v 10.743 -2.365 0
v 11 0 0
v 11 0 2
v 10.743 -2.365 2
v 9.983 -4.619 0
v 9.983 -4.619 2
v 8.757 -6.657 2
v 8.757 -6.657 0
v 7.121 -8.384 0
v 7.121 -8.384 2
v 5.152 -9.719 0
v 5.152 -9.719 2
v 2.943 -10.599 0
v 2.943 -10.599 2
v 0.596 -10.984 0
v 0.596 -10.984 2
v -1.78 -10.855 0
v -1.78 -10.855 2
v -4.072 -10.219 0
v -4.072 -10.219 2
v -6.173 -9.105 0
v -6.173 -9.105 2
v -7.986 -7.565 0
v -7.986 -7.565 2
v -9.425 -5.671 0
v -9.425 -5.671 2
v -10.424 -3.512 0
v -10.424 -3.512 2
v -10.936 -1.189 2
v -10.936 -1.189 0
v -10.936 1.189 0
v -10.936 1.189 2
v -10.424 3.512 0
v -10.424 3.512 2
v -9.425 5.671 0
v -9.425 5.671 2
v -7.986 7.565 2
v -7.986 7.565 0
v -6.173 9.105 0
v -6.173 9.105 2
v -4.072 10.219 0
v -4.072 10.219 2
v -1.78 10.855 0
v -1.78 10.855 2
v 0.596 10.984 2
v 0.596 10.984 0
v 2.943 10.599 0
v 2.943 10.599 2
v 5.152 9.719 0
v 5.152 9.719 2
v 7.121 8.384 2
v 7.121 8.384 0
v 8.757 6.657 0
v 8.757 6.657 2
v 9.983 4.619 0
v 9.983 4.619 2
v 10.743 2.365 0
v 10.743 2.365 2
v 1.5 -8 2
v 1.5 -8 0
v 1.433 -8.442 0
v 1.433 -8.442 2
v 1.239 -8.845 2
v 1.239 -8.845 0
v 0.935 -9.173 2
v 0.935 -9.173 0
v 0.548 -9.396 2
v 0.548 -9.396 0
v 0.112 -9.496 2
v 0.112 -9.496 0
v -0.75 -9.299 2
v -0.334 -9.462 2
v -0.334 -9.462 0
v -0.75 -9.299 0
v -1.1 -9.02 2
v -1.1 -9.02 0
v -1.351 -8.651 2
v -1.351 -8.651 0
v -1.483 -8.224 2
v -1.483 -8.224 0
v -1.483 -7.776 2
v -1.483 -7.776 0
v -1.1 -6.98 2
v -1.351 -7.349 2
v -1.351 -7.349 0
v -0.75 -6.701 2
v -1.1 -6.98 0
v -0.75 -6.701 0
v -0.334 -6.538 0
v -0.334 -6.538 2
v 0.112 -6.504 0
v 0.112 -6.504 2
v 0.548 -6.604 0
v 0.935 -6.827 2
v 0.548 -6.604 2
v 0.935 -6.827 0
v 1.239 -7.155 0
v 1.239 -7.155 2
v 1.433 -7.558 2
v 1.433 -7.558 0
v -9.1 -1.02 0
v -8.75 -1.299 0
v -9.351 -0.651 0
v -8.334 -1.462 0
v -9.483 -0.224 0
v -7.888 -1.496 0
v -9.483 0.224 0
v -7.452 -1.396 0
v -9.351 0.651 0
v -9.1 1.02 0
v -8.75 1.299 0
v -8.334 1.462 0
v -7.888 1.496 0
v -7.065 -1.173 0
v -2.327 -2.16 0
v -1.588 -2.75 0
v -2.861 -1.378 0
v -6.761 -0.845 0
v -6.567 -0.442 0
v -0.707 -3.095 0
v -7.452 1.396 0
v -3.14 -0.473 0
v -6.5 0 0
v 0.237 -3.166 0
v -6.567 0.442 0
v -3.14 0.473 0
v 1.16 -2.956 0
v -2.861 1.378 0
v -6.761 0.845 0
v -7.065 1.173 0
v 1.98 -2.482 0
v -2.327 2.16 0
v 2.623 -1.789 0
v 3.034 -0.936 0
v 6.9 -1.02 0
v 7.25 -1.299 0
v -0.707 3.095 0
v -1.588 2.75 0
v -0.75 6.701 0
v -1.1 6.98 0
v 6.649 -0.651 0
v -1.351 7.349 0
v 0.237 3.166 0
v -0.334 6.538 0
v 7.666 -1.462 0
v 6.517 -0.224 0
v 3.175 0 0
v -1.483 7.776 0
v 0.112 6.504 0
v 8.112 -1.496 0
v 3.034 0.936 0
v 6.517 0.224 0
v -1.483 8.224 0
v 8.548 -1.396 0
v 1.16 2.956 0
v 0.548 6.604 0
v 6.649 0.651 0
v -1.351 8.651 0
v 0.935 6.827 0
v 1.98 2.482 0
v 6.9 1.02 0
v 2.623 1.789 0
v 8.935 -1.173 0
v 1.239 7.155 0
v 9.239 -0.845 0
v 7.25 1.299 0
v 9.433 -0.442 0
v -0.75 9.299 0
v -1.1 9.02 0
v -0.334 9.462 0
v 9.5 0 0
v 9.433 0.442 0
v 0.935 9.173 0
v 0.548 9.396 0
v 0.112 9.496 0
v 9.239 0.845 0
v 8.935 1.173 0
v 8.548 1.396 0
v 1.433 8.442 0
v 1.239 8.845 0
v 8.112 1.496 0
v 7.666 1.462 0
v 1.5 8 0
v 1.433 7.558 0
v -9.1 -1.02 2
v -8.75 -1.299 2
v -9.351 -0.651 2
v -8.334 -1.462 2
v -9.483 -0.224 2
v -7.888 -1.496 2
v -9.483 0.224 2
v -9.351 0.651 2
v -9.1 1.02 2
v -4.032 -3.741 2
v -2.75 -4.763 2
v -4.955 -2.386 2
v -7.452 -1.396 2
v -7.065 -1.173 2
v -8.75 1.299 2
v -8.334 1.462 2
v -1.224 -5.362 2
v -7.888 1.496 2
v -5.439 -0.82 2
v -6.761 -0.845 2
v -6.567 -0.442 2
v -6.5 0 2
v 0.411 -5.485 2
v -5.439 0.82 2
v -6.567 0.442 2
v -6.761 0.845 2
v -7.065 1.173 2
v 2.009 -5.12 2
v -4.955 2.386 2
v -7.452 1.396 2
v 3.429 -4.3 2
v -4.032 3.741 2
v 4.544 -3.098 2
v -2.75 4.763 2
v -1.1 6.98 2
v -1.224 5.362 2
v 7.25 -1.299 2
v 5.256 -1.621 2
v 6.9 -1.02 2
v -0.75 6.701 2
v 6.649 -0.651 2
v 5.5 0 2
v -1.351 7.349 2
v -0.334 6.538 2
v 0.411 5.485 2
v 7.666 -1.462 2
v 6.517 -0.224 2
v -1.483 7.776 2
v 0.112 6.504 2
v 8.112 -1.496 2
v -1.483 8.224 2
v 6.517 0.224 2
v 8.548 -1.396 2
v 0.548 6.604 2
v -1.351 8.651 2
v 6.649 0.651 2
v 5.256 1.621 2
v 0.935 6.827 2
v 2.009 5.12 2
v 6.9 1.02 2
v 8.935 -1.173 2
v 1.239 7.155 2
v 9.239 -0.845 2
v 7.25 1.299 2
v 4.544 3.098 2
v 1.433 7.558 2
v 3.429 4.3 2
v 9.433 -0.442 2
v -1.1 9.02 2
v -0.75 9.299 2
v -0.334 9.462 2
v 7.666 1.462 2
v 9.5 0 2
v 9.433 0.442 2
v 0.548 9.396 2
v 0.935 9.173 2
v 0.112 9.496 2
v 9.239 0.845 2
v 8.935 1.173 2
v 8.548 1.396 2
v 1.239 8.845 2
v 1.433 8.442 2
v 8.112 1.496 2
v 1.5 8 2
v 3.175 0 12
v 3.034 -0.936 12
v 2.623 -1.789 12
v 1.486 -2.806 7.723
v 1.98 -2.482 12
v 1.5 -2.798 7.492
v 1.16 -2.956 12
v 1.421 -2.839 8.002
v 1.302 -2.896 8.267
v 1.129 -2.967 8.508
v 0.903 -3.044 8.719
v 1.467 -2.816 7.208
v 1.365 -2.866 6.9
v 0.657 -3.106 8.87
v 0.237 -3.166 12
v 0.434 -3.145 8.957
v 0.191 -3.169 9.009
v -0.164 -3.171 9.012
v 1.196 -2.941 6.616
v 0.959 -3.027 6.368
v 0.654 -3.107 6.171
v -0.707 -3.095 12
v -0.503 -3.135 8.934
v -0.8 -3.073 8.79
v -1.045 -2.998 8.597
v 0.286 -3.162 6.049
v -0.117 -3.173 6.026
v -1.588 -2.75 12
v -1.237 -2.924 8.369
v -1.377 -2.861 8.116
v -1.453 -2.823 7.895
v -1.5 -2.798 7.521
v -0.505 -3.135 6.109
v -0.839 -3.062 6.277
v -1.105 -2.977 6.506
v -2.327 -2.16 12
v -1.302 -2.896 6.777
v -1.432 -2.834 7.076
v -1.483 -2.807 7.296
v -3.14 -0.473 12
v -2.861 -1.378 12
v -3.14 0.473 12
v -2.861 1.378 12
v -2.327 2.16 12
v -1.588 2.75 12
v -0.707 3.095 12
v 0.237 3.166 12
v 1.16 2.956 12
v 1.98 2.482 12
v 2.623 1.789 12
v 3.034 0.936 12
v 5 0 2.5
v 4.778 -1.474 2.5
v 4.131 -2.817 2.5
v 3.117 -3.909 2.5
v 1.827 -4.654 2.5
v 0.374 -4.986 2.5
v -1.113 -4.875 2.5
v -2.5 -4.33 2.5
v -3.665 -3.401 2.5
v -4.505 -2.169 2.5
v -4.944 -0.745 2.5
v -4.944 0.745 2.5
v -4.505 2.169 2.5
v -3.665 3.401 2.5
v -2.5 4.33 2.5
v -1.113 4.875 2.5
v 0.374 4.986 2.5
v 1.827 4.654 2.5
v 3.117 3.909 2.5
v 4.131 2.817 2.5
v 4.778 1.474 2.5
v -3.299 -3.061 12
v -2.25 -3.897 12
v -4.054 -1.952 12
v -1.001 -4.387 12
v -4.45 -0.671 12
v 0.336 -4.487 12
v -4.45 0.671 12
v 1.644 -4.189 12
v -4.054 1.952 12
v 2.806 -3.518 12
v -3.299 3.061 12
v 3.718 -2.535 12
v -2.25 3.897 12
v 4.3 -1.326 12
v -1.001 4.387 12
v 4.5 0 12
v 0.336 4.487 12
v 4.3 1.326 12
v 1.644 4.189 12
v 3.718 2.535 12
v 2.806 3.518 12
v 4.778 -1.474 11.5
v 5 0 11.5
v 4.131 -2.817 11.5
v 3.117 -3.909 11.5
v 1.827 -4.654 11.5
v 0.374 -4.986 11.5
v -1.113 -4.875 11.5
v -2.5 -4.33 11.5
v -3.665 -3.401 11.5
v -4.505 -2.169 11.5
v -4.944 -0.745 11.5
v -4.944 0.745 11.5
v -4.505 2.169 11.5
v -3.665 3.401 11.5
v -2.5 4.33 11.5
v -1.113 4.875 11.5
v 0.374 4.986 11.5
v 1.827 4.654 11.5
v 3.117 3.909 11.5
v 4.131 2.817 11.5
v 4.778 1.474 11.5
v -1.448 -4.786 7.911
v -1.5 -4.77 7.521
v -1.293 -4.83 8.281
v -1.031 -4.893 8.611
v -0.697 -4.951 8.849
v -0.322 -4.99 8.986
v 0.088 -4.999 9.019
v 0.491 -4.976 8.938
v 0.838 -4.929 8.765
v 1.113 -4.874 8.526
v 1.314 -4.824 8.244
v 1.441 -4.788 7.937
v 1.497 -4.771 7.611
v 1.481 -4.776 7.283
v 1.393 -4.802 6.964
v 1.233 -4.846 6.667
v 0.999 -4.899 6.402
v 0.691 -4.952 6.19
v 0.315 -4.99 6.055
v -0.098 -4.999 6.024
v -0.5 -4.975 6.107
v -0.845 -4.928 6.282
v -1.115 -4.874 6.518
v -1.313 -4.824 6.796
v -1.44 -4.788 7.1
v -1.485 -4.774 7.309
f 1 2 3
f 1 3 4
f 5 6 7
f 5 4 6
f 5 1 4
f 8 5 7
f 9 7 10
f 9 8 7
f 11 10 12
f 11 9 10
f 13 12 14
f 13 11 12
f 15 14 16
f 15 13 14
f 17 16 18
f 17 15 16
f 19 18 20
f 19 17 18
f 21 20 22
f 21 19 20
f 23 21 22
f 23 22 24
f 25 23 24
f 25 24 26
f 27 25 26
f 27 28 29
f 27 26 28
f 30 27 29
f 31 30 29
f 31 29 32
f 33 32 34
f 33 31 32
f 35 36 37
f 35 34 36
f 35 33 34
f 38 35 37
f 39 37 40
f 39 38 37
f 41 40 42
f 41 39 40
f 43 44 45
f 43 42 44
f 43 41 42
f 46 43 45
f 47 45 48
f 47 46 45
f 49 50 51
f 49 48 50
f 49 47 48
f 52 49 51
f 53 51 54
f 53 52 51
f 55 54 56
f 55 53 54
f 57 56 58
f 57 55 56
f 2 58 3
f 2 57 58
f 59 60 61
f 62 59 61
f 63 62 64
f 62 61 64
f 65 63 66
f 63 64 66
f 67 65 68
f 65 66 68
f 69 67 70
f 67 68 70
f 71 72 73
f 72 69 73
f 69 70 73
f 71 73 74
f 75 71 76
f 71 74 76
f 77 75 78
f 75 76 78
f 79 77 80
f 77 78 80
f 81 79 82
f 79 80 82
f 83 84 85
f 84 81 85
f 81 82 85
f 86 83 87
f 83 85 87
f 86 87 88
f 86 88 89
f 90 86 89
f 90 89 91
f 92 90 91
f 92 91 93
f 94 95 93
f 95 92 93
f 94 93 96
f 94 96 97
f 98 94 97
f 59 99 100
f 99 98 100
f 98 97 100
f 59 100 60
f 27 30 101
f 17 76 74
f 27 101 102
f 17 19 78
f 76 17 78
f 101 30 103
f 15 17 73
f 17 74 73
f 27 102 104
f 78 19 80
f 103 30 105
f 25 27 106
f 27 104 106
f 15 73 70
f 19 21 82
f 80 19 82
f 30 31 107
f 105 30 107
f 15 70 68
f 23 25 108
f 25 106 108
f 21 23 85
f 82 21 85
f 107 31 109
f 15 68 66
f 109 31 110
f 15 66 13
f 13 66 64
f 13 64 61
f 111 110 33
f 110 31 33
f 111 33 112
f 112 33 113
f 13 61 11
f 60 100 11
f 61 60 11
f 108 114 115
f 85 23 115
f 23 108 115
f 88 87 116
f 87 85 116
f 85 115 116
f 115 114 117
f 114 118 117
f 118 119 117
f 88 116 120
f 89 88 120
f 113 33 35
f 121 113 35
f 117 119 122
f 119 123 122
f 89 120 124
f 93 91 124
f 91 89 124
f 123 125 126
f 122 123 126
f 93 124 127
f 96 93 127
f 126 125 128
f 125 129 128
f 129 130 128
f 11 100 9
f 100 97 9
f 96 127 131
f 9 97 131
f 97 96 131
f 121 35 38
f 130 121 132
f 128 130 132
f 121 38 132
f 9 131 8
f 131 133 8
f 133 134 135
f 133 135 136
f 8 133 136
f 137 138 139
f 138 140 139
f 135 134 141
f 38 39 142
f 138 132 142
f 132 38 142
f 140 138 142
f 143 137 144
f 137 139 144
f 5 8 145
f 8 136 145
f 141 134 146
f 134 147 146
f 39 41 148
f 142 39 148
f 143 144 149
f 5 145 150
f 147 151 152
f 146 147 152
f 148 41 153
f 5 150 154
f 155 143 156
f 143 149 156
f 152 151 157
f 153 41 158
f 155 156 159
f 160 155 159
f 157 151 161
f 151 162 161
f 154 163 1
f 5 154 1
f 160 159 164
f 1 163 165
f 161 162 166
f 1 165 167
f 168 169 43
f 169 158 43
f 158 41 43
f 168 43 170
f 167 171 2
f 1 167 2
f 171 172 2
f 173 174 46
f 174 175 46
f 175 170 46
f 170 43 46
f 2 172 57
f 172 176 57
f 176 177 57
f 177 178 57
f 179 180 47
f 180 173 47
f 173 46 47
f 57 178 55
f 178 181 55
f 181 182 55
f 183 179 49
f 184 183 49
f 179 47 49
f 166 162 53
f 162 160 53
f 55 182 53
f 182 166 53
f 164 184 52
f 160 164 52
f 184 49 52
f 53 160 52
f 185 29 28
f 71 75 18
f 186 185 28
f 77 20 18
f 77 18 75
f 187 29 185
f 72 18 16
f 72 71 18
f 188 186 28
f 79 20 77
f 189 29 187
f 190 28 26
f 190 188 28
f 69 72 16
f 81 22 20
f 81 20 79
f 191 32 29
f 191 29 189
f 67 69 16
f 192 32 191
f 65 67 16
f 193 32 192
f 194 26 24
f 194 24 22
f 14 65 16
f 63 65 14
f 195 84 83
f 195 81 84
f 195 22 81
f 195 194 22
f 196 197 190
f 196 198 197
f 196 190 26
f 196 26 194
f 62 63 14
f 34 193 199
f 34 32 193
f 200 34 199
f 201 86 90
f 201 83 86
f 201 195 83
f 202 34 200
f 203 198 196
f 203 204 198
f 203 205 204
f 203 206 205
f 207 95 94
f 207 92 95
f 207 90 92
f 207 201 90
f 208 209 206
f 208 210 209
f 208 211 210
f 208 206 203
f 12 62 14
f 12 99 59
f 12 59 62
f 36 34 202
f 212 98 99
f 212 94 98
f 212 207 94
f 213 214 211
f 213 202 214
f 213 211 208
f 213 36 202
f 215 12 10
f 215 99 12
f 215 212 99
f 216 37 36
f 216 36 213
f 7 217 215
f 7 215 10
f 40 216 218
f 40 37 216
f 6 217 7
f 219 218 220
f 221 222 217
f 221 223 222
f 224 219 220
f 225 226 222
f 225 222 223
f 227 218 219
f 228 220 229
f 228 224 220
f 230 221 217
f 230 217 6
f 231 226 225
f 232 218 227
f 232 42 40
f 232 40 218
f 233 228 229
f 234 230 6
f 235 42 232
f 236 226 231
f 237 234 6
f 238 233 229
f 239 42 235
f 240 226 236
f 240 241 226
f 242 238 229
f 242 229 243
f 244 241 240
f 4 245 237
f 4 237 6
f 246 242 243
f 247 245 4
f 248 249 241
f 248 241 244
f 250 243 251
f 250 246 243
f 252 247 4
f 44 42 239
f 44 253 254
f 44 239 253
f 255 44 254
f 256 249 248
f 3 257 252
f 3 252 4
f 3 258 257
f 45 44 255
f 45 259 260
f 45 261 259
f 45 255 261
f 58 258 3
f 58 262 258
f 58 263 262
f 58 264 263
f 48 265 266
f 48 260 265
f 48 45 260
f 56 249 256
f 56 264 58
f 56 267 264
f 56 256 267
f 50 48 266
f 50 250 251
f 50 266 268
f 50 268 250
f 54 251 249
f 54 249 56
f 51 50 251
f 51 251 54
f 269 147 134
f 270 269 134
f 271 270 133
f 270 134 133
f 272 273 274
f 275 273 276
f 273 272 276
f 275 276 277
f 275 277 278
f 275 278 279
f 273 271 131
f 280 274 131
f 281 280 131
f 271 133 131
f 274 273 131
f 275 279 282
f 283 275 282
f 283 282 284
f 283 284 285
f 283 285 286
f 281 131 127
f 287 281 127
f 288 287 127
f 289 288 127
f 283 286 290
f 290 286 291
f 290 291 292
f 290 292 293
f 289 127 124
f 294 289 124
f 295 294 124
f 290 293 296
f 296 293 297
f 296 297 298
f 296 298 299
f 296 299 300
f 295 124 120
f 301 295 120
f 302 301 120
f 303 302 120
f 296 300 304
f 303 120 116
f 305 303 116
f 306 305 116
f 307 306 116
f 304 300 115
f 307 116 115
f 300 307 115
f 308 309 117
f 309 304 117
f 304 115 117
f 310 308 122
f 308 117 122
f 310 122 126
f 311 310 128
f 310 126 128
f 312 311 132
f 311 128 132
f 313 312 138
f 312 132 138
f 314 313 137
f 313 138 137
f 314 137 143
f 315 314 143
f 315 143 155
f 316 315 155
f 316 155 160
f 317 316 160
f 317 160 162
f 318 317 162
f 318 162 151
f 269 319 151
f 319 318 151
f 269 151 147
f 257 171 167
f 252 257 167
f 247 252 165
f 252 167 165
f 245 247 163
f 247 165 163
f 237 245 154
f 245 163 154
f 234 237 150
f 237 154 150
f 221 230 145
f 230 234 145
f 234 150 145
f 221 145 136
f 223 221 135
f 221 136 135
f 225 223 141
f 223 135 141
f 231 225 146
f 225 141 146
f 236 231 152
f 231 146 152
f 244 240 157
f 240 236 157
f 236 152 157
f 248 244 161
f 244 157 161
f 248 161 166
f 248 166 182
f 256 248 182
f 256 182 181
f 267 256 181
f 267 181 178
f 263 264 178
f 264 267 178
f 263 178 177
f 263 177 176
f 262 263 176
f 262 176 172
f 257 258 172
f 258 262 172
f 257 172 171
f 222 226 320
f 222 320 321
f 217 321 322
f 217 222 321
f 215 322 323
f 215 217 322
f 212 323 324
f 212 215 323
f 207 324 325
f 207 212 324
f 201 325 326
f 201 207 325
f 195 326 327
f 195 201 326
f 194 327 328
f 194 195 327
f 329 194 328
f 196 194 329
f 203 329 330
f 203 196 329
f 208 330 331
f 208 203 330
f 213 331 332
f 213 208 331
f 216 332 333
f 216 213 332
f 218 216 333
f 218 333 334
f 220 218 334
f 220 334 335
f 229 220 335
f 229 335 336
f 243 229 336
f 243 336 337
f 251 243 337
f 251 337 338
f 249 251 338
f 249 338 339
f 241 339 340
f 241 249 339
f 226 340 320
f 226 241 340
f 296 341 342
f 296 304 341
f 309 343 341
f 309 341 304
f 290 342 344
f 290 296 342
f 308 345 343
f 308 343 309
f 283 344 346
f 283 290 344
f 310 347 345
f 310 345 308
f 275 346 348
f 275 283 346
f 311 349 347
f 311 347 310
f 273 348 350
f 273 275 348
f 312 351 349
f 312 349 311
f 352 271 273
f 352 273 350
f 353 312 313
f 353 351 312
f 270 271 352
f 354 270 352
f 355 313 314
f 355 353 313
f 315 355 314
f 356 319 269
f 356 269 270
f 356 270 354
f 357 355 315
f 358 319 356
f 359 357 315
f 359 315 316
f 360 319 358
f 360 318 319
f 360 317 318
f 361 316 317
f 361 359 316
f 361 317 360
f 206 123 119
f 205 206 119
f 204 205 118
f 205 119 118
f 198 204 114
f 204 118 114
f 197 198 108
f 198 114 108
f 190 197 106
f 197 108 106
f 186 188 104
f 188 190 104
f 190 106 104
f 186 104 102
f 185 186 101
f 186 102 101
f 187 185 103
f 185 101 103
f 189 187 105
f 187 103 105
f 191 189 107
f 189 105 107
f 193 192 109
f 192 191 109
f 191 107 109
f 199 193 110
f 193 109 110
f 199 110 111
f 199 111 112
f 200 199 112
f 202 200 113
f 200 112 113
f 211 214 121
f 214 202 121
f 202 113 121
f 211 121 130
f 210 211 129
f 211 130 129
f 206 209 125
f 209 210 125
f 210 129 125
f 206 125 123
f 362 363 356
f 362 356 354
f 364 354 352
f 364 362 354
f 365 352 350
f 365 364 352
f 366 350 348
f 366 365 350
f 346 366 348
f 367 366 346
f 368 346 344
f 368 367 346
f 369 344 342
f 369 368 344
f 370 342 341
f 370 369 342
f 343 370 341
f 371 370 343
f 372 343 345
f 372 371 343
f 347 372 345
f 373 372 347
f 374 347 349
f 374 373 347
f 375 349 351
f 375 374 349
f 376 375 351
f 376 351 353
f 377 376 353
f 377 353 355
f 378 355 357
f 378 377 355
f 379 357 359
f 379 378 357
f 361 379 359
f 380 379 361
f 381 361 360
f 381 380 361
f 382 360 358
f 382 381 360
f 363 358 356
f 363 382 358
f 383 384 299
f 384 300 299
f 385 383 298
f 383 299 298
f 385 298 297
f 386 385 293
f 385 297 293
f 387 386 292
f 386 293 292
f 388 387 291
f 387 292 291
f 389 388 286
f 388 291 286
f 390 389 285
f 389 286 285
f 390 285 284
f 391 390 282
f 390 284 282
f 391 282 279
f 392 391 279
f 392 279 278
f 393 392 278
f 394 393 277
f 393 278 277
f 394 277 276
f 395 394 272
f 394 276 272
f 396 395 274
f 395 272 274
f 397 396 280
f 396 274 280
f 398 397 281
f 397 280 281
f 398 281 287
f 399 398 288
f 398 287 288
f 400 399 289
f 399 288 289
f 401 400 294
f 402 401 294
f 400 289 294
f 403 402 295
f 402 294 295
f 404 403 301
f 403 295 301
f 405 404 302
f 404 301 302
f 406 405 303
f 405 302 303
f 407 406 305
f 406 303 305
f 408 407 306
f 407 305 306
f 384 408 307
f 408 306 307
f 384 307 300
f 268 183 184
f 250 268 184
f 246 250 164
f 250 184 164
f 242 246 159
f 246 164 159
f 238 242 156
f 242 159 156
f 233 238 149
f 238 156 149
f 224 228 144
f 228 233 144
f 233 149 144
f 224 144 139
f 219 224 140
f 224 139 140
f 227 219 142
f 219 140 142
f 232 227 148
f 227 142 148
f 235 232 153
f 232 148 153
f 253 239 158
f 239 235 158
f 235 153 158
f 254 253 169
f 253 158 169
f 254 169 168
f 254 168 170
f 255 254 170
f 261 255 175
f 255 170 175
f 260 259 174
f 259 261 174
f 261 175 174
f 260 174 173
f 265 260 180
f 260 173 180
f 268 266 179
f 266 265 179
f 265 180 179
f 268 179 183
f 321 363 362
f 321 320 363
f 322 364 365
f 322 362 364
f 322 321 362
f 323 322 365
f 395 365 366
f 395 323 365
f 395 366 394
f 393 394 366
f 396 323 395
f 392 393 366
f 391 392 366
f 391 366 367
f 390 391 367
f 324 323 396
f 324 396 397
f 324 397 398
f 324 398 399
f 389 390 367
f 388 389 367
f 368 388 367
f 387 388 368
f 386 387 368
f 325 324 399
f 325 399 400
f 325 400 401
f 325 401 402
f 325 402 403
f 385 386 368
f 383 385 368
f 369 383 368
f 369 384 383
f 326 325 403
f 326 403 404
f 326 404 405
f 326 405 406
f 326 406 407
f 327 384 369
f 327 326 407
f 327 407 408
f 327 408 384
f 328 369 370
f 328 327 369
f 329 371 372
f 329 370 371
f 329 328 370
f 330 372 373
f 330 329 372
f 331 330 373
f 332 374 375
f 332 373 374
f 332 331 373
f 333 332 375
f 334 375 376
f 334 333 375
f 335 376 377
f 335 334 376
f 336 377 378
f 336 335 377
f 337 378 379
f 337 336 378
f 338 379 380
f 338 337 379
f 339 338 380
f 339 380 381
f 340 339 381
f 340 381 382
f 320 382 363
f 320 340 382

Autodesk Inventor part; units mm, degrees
ref_plane "YZ Plane" through (0, 0, 0) normal (1, 0, 0) x (0, 1, 0)
ref_plane "XZ Plane" through (0, 0, 0) normal (0, 1, 0) x (-1, 0, 0)
ref_plane "XY Plane" through (0, 0, 0) normal (0, 0, 1) x (1, 0, 0)
sketch "Sketch1" plane through (0, 0, 0) normal (0, 0, 1) x (1, 0, 0)
  circle A0 centre (0, 0) radius 3.175
  circle A1 centre (0, 0) radius 5
  circle A2 centre (0, 0) radius 11
  circle A3 centre (0, 8) radius 1.5
  circle A4 centre (-8, 0) radius 1.5
  circle A5 centre (0, -8) radius 1.5
  circle A6 centre (8, 0) radius 1.5
  dimension "d0" = 22
  dimension "d1" = 6.35
  dimension "d2" = 10
  dimension "d3" = 3
  dimension "d4" = 8
  dimension "d7" = 360
extrude "Extrusion1" add sketch "Sketch1" along normal blind 12 contours A1
extrude "Extrusion2" add sketch "Sketch1" along normal blind 2 contours A2
chamfer "Chamfer1" distance 0.5 angle 45 2 edges at (-5, 0, 2) (-5, 0, 12)
sketch "Sketch3" plane through (0, 0, 0) normal (0, 1, 0) x (-1, 0, 0)
  circle A0 centre (0, 7.5211) radius 1.5
  point P0 (0, 0)
  dimension "d16" = 3
extrude "Extrusion3" cut sketch "Sketch3" against normal blind 10
equation "\"BendRadius\" = Thickness"
equation "\"BendReliefWidth\" = Thickness"
equation "\"BendReliefDepth\" = 0.5 * Thickness"
equation "\"CornerReliefSize\" = 4 * Thickness"
equation "\"MinimumRemnant\" = 2 * Thickness"
equation "\"TransitionRadius\" = BendRadius"
equation "\"JacobiRadiusSize\" = BendRadius"
equation "\"GapSize\" = Thickness"
equation "\"Thickness\" = 0.5"
properties part number "mặt bích"
